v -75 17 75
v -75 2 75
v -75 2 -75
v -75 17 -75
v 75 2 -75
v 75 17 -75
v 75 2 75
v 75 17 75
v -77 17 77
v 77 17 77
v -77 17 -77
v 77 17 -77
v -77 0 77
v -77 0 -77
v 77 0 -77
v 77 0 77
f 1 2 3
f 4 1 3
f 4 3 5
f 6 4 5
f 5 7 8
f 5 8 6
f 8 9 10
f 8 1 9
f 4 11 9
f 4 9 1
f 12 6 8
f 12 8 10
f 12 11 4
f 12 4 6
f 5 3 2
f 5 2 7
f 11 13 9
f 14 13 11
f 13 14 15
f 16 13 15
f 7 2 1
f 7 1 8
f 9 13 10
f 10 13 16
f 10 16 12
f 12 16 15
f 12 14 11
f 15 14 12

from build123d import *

# Parameters (mm, degrees)
SKETCH1_W           = 150
SKETCH1_H           = 150
BOSS_EXTRUDE1_DEPTH = 2
SKETCH2_W           = 154
SKETCH2_H           = 154
BOSS_EXTRUDE2_DEPTH = 2
SKETCH3_W           = 154
SKETCH3_H           = 154
SKETCH3_W_2         = 150
SKETCH3_H_2         = 150
BOSS_EXTRUDE3_DEPTH = 15


with BuildPart() as part:
    # Sketch1 → Boss-Extrude1 (new body)
    with BuildSketch(Plane(origin=(0, 0, 0), x_dir=(1, 0, 0), z_dir=(0, 1, 0))):
        Rectangle(SKETCH1_W, SKETCH1_H)
    extrude(amount=BOSS_EXTRUDE1_DEPTH)

    # Sketch2 → Boss-Extrude2 (add)
    with BuildSketch(Plane(origin=(0, 2, 0), x_dir=(1, 0, 0), z_dir=(0, 1, 0))):
        Rectangle(SKETCH2_W, SKETCH2_H)
    extrude(amount=-BOSS_EXTRUDE2_DEPTH)

    # Sketch3 → Boss-Extrude3 (add)
    with BuildSketch(Plane(origin=(0, 2, 0), x_dir=(1, 0, 0), z_dir=(0, 1, 0))):
        Rectangle(SKETCH3_W, SKETCH3_H)
        Rectangle(SKETCH3_W_2, SKETCH3_H_2, mode=Mode.SUBTRACT)
    extrude(amount=BOSS_EXTRUDE3_DEPTH)


solid = part.part
